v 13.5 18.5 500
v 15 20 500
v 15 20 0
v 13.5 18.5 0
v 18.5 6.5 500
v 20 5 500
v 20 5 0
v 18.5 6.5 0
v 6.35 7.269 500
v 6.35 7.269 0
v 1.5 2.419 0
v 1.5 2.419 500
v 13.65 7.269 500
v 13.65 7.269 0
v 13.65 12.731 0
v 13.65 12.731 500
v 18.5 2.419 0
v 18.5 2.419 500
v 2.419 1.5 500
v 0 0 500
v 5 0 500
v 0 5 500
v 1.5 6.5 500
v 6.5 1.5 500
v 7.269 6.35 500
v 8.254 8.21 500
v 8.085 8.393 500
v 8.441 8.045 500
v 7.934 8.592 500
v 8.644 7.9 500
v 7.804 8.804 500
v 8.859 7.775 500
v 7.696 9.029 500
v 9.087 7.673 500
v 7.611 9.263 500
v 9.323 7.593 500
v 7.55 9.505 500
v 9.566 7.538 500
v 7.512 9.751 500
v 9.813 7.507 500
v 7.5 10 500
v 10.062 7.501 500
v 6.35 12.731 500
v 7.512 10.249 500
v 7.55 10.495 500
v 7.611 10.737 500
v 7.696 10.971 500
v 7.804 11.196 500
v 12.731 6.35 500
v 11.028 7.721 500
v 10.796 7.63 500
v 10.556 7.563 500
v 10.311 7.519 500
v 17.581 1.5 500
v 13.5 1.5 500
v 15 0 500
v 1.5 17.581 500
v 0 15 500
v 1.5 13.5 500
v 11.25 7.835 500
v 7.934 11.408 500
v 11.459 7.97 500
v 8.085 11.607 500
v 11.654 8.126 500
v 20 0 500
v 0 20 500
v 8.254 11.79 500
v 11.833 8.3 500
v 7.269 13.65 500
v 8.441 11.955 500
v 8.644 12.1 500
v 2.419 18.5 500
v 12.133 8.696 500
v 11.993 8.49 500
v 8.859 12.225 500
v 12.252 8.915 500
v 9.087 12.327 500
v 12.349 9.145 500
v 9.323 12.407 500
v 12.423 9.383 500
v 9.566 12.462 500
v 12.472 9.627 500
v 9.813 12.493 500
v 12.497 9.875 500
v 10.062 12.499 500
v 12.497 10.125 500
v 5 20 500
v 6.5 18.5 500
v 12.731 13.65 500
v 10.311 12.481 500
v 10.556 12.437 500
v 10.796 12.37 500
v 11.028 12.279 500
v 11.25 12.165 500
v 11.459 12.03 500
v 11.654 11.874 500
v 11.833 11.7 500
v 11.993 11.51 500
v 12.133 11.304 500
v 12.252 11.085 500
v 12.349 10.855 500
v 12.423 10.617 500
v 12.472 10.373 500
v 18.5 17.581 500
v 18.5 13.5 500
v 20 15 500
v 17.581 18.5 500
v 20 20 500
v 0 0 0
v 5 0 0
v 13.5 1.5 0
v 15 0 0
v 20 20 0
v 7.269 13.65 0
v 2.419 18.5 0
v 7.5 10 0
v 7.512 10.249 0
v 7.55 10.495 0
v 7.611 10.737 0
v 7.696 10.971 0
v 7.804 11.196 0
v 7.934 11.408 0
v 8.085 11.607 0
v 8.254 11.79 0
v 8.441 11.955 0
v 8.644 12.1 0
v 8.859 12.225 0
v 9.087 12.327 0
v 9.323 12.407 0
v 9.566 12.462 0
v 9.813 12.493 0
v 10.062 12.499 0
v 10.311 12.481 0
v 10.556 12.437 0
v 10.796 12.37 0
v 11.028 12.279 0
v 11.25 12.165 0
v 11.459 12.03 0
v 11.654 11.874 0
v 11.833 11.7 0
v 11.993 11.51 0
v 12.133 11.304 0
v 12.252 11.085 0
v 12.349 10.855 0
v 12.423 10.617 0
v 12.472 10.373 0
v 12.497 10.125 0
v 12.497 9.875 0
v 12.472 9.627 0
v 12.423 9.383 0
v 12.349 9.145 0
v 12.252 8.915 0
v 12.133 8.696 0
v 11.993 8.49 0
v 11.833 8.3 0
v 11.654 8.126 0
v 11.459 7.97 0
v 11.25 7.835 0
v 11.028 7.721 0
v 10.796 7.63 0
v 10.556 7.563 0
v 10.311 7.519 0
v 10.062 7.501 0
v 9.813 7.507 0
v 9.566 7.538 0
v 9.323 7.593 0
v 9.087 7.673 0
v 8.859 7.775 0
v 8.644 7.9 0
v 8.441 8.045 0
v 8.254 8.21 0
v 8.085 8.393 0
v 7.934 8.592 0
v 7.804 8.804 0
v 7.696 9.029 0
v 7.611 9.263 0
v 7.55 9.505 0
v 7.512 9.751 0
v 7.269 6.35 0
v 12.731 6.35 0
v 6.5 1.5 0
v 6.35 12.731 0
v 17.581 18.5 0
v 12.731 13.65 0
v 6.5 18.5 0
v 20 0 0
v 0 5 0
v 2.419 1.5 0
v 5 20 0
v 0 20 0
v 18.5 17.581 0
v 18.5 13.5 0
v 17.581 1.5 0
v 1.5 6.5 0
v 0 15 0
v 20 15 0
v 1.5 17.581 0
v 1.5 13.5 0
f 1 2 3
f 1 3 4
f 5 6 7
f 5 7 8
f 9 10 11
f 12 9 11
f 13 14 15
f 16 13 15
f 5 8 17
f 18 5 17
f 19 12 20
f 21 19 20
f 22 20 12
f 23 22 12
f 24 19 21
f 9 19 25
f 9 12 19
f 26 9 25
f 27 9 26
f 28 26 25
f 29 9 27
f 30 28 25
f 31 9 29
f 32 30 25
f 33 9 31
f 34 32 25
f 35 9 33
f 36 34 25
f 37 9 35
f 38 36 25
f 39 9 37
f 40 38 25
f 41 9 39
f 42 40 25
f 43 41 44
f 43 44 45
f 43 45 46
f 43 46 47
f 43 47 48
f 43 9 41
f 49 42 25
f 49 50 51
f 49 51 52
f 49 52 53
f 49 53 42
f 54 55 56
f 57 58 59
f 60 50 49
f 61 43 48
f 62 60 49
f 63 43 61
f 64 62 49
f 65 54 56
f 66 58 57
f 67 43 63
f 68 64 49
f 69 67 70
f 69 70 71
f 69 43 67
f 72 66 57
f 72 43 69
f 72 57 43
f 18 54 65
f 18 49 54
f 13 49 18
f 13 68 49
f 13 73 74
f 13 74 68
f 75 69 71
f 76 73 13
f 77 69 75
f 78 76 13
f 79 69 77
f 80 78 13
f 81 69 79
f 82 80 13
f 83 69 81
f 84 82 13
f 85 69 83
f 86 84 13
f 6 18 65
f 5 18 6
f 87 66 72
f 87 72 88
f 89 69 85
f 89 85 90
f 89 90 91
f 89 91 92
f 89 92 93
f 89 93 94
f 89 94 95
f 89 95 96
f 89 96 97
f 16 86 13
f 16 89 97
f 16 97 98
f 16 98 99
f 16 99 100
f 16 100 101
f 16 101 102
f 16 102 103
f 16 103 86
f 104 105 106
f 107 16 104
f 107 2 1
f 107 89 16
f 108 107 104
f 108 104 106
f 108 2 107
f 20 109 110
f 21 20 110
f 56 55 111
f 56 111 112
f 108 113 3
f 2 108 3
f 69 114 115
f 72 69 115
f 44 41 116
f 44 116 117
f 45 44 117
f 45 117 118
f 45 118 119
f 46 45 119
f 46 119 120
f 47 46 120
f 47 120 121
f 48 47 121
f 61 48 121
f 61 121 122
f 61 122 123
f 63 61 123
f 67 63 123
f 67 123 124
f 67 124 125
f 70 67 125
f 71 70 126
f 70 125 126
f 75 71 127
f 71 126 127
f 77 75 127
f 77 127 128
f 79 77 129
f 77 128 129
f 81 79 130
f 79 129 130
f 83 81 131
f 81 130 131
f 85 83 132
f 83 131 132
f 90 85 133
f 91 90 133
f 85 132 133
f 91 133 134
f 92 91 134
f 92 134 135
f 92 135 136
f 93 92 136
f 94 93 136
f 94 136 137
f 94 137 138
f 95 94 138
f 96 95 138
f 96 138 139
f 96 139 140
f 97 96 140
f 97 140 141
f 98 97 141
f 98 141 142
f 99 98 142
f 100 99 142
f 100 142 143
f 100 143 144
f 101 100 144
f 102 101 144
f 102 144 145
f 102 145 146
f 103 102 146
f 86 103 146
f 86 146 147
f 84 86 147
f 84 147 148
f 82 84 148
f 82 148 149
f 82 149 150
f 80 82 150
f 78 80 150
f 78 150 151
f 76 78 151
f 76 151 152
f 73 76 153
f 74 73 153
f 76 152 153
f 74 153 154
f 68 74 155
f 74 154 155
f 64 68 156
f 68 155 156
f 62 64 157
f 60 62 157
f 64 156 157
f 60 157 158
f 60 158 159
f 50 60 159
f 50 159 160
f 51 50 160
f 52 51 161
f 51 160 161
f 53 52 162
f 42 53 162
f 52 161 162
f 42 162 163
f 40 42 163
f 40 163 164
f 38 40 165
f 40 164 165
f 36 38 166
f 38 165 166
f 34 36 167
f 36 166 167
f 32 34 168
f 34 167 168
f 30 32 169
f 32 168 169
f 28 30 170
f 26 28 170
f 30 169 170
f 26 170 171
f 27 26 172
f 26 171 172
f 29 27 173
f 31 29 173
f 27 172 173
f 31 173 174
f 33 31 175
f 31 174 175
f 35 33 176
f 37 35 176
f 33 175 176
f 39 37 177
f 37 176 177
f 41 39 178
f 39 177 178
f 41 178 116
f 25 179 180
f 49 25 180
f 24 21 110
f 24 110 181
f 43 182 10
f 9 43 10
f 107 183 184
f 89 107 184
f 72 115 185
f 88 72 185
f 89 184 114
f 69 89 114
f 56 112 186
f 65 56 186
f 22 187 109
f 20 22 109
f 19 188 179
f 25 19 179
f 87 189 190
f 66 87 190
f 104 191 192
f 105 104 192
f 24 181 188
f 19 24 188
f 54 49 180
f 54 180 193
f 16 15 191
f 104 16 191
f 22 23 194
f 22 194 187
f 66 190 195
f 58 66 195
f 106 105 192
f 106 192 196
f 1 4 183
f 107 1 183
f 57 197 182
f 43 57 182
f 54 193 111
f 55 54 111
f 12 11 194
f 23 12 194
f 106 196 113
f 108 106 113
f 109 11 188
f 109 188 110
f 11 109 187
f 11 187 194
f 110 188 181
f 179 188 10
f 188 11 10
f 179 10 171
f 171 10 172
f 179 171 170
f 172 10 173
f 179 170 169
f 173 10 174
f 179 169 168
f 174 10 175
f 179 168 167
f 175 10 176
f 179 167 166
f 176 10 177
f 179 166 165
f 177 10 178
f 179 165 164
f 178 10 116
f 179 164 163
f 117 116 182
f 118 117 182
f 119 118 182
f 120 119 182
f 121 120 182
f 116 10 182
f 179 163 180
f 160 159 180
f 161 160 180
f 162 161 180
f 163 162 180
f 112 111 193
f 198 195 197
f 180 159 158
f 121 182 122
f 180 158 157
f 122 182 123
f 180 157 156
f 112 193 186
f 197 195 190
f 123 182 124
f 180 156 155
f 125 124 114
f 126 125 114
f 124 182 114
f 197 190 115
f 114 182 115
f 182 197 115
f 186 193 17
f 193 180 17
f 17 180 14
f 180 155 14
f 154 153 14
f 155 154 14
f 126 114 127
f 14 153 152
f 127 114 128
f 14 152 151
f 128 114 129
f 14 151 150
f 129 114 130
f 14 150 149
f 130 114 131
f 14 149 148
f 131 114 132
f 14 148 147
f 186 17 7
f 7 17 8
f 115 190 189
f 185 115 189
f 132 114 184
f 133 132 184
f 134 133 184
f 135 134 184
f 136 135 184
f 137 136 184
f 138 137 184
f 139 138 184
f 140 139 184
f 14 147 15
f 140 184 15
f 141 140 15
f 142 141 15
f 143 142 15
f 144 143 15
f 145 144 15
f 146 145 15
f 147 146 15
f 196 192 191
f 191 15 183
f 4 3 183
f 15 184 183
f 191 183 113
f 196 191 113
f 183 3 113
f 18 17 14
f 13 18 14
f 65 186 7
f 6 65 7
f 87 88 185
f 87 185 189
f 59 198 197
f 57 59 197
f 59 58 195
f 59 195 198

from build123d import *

# Parameters (mm, degrees)
EXTRUDE_1_DEPTH     = 500
SKETCH_2_R          = 2.5
CUT_EXTRUDE_1_DEPTH = 501.799361022


with BuildPart() as part:
    # 草图1 → 凸台-拉伸1 (new body)
    with BuildSketch(Plane.XY):
        Polygon((0, 0), (5, 0), (6.5, 1.5), (2.419238816, 1.5), (7.269238816, 6.35), (12.730761184, 6.35), (17.580761184, 1.5), (13.5, 1.5), (15, 0), (20, 0), (20, 5), (18.5, 6.5), (18.5, 2.419238816), (13.65, 7.269238816), (13.65, 12.730761184), (18.5, 17.580761184), (18.5, 13.5), (20, 15), (20, 20), (15, 20), (13.5, 18.5), (17.580761184, 18.5), (12.730761184, 13.65), (7.269238816, 13.65), (2.419238816, 18.5), (6.5, 18.5), (5, 20), (0, 20), (0, 15), (1.5, 13.5), (1.5, 17.580761184), (6.35, 12.730761184), (6.35, 7.269238816), (1.5, 2.419238816), (1.5, 6.5), (0, 5), align=None)
    extrude(amount=EXTRUDE_1_DEPTH)

    # 草图2 → 切除-拉伸1 (cut, through all)
    with BuildSketch(Plane(origin=(0, 0, 0), x_dir=(-1, 0, 0), z_dir=(0, 0, -1))):
        with Locations((-10, 10)):
            Circle(SKETCH_2_R)
    extrude(amount=-CUT_EXTRUDE_1_DEPTH, mode=Mode.SUBTRACT)


solid = part.part
